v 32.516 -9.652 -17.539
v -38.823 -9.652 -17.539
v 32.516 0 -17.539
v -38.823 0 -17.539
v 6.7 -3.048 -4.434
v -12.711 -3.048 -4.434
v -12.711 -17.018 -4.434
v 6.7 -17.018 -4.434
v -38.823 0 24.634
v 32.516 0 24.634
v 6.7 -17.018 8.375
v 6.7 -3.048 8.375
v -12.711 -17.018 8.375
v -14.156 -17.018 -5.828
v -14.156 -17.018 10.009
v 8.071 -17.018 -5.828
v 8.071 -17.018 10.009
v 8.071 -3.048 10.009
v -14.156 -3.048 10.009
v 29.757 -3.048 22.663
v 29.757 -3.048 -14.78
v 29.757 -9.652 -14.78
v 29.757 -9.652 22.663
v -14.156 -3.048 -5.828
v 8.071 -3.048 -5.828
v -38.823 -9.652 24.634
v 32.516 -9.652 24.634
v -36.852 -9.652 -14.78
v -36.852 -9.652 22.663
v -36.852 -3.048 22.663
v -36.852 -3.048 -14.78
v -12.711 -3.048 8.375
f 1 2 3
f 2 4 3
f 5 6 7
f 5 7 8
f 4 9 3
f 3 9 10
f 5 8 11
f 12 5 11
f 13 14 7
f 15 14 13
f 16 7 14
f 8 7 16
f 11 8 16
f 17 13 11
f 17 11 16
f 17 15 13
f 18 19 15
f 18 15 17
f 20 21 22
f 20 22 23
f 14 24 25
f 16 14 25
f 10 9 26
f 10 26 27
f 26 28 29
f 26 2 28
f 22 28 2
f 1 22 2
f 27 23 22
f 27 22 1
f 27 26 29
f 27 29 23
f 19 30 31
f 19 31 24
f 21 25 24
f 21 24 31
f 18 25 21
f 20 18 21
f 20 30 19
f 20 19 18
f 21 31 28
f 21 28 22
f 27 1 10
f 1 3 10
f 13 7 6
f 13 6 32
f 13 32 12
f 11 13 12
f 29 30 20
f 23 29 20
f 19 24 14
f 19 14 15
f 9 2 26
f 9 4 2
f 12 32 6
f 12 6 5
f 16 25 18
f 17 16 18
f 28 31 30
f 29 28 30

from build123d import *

# Parameters (mm, degrees)
F0_W     = 71.338967
F0_H     = 42.17276
F1_DEPTH = 3.048
F2_W     = 71.338967
F2_H     = 42.17276
F2_W_2   = 66.609312
F2_H_2   = 37.443103
F3_DEPTH = 6.604
F4_W     = 22.226787
F4_H     = 15.836691
F4_W_2   = 19.411293
F4_H_2   = 12.809481
F5_DEPTH = 13.97


with BuildPart() as f1:
    # F0 (on Front) → F1 (new body)
    with BuildSketch(Plane.XZ):
        with Locations((-3.153104, 3.547242)):
            Rectangle(F0_W, F0_H)
    extrude(amount=F1_DEPTH)

    # F2 (on face) → F3 (join)
    with BuildSketch(Plane.XZ.offset(3.048)):
        with Locations((-3.153104, 3.547242)):
            Rectangle(F2_W, F2_H)
        with Locations((-3.547242, 3.941378)):
            Rectangle(F2_W_2, F2_H_2, mode=Mode.SUBTRACT)
    extrude(amount=F3_DEPTH)

    # F4 (on face) → F5 (join)
    with BuildSketch(Plane.XZ.offset(3.048)):
        with Locations((-3.042677, 2.090226)):
            Rectangle(F4_W, F4_H)
        with Locations((-3.005302, 1.970689)):
            Rectangle(F4_W_2, F4_H_2, mode=Mode.SUBTRACT)
    extrude(amount=F5_DEPTH)


solid = f1.part
